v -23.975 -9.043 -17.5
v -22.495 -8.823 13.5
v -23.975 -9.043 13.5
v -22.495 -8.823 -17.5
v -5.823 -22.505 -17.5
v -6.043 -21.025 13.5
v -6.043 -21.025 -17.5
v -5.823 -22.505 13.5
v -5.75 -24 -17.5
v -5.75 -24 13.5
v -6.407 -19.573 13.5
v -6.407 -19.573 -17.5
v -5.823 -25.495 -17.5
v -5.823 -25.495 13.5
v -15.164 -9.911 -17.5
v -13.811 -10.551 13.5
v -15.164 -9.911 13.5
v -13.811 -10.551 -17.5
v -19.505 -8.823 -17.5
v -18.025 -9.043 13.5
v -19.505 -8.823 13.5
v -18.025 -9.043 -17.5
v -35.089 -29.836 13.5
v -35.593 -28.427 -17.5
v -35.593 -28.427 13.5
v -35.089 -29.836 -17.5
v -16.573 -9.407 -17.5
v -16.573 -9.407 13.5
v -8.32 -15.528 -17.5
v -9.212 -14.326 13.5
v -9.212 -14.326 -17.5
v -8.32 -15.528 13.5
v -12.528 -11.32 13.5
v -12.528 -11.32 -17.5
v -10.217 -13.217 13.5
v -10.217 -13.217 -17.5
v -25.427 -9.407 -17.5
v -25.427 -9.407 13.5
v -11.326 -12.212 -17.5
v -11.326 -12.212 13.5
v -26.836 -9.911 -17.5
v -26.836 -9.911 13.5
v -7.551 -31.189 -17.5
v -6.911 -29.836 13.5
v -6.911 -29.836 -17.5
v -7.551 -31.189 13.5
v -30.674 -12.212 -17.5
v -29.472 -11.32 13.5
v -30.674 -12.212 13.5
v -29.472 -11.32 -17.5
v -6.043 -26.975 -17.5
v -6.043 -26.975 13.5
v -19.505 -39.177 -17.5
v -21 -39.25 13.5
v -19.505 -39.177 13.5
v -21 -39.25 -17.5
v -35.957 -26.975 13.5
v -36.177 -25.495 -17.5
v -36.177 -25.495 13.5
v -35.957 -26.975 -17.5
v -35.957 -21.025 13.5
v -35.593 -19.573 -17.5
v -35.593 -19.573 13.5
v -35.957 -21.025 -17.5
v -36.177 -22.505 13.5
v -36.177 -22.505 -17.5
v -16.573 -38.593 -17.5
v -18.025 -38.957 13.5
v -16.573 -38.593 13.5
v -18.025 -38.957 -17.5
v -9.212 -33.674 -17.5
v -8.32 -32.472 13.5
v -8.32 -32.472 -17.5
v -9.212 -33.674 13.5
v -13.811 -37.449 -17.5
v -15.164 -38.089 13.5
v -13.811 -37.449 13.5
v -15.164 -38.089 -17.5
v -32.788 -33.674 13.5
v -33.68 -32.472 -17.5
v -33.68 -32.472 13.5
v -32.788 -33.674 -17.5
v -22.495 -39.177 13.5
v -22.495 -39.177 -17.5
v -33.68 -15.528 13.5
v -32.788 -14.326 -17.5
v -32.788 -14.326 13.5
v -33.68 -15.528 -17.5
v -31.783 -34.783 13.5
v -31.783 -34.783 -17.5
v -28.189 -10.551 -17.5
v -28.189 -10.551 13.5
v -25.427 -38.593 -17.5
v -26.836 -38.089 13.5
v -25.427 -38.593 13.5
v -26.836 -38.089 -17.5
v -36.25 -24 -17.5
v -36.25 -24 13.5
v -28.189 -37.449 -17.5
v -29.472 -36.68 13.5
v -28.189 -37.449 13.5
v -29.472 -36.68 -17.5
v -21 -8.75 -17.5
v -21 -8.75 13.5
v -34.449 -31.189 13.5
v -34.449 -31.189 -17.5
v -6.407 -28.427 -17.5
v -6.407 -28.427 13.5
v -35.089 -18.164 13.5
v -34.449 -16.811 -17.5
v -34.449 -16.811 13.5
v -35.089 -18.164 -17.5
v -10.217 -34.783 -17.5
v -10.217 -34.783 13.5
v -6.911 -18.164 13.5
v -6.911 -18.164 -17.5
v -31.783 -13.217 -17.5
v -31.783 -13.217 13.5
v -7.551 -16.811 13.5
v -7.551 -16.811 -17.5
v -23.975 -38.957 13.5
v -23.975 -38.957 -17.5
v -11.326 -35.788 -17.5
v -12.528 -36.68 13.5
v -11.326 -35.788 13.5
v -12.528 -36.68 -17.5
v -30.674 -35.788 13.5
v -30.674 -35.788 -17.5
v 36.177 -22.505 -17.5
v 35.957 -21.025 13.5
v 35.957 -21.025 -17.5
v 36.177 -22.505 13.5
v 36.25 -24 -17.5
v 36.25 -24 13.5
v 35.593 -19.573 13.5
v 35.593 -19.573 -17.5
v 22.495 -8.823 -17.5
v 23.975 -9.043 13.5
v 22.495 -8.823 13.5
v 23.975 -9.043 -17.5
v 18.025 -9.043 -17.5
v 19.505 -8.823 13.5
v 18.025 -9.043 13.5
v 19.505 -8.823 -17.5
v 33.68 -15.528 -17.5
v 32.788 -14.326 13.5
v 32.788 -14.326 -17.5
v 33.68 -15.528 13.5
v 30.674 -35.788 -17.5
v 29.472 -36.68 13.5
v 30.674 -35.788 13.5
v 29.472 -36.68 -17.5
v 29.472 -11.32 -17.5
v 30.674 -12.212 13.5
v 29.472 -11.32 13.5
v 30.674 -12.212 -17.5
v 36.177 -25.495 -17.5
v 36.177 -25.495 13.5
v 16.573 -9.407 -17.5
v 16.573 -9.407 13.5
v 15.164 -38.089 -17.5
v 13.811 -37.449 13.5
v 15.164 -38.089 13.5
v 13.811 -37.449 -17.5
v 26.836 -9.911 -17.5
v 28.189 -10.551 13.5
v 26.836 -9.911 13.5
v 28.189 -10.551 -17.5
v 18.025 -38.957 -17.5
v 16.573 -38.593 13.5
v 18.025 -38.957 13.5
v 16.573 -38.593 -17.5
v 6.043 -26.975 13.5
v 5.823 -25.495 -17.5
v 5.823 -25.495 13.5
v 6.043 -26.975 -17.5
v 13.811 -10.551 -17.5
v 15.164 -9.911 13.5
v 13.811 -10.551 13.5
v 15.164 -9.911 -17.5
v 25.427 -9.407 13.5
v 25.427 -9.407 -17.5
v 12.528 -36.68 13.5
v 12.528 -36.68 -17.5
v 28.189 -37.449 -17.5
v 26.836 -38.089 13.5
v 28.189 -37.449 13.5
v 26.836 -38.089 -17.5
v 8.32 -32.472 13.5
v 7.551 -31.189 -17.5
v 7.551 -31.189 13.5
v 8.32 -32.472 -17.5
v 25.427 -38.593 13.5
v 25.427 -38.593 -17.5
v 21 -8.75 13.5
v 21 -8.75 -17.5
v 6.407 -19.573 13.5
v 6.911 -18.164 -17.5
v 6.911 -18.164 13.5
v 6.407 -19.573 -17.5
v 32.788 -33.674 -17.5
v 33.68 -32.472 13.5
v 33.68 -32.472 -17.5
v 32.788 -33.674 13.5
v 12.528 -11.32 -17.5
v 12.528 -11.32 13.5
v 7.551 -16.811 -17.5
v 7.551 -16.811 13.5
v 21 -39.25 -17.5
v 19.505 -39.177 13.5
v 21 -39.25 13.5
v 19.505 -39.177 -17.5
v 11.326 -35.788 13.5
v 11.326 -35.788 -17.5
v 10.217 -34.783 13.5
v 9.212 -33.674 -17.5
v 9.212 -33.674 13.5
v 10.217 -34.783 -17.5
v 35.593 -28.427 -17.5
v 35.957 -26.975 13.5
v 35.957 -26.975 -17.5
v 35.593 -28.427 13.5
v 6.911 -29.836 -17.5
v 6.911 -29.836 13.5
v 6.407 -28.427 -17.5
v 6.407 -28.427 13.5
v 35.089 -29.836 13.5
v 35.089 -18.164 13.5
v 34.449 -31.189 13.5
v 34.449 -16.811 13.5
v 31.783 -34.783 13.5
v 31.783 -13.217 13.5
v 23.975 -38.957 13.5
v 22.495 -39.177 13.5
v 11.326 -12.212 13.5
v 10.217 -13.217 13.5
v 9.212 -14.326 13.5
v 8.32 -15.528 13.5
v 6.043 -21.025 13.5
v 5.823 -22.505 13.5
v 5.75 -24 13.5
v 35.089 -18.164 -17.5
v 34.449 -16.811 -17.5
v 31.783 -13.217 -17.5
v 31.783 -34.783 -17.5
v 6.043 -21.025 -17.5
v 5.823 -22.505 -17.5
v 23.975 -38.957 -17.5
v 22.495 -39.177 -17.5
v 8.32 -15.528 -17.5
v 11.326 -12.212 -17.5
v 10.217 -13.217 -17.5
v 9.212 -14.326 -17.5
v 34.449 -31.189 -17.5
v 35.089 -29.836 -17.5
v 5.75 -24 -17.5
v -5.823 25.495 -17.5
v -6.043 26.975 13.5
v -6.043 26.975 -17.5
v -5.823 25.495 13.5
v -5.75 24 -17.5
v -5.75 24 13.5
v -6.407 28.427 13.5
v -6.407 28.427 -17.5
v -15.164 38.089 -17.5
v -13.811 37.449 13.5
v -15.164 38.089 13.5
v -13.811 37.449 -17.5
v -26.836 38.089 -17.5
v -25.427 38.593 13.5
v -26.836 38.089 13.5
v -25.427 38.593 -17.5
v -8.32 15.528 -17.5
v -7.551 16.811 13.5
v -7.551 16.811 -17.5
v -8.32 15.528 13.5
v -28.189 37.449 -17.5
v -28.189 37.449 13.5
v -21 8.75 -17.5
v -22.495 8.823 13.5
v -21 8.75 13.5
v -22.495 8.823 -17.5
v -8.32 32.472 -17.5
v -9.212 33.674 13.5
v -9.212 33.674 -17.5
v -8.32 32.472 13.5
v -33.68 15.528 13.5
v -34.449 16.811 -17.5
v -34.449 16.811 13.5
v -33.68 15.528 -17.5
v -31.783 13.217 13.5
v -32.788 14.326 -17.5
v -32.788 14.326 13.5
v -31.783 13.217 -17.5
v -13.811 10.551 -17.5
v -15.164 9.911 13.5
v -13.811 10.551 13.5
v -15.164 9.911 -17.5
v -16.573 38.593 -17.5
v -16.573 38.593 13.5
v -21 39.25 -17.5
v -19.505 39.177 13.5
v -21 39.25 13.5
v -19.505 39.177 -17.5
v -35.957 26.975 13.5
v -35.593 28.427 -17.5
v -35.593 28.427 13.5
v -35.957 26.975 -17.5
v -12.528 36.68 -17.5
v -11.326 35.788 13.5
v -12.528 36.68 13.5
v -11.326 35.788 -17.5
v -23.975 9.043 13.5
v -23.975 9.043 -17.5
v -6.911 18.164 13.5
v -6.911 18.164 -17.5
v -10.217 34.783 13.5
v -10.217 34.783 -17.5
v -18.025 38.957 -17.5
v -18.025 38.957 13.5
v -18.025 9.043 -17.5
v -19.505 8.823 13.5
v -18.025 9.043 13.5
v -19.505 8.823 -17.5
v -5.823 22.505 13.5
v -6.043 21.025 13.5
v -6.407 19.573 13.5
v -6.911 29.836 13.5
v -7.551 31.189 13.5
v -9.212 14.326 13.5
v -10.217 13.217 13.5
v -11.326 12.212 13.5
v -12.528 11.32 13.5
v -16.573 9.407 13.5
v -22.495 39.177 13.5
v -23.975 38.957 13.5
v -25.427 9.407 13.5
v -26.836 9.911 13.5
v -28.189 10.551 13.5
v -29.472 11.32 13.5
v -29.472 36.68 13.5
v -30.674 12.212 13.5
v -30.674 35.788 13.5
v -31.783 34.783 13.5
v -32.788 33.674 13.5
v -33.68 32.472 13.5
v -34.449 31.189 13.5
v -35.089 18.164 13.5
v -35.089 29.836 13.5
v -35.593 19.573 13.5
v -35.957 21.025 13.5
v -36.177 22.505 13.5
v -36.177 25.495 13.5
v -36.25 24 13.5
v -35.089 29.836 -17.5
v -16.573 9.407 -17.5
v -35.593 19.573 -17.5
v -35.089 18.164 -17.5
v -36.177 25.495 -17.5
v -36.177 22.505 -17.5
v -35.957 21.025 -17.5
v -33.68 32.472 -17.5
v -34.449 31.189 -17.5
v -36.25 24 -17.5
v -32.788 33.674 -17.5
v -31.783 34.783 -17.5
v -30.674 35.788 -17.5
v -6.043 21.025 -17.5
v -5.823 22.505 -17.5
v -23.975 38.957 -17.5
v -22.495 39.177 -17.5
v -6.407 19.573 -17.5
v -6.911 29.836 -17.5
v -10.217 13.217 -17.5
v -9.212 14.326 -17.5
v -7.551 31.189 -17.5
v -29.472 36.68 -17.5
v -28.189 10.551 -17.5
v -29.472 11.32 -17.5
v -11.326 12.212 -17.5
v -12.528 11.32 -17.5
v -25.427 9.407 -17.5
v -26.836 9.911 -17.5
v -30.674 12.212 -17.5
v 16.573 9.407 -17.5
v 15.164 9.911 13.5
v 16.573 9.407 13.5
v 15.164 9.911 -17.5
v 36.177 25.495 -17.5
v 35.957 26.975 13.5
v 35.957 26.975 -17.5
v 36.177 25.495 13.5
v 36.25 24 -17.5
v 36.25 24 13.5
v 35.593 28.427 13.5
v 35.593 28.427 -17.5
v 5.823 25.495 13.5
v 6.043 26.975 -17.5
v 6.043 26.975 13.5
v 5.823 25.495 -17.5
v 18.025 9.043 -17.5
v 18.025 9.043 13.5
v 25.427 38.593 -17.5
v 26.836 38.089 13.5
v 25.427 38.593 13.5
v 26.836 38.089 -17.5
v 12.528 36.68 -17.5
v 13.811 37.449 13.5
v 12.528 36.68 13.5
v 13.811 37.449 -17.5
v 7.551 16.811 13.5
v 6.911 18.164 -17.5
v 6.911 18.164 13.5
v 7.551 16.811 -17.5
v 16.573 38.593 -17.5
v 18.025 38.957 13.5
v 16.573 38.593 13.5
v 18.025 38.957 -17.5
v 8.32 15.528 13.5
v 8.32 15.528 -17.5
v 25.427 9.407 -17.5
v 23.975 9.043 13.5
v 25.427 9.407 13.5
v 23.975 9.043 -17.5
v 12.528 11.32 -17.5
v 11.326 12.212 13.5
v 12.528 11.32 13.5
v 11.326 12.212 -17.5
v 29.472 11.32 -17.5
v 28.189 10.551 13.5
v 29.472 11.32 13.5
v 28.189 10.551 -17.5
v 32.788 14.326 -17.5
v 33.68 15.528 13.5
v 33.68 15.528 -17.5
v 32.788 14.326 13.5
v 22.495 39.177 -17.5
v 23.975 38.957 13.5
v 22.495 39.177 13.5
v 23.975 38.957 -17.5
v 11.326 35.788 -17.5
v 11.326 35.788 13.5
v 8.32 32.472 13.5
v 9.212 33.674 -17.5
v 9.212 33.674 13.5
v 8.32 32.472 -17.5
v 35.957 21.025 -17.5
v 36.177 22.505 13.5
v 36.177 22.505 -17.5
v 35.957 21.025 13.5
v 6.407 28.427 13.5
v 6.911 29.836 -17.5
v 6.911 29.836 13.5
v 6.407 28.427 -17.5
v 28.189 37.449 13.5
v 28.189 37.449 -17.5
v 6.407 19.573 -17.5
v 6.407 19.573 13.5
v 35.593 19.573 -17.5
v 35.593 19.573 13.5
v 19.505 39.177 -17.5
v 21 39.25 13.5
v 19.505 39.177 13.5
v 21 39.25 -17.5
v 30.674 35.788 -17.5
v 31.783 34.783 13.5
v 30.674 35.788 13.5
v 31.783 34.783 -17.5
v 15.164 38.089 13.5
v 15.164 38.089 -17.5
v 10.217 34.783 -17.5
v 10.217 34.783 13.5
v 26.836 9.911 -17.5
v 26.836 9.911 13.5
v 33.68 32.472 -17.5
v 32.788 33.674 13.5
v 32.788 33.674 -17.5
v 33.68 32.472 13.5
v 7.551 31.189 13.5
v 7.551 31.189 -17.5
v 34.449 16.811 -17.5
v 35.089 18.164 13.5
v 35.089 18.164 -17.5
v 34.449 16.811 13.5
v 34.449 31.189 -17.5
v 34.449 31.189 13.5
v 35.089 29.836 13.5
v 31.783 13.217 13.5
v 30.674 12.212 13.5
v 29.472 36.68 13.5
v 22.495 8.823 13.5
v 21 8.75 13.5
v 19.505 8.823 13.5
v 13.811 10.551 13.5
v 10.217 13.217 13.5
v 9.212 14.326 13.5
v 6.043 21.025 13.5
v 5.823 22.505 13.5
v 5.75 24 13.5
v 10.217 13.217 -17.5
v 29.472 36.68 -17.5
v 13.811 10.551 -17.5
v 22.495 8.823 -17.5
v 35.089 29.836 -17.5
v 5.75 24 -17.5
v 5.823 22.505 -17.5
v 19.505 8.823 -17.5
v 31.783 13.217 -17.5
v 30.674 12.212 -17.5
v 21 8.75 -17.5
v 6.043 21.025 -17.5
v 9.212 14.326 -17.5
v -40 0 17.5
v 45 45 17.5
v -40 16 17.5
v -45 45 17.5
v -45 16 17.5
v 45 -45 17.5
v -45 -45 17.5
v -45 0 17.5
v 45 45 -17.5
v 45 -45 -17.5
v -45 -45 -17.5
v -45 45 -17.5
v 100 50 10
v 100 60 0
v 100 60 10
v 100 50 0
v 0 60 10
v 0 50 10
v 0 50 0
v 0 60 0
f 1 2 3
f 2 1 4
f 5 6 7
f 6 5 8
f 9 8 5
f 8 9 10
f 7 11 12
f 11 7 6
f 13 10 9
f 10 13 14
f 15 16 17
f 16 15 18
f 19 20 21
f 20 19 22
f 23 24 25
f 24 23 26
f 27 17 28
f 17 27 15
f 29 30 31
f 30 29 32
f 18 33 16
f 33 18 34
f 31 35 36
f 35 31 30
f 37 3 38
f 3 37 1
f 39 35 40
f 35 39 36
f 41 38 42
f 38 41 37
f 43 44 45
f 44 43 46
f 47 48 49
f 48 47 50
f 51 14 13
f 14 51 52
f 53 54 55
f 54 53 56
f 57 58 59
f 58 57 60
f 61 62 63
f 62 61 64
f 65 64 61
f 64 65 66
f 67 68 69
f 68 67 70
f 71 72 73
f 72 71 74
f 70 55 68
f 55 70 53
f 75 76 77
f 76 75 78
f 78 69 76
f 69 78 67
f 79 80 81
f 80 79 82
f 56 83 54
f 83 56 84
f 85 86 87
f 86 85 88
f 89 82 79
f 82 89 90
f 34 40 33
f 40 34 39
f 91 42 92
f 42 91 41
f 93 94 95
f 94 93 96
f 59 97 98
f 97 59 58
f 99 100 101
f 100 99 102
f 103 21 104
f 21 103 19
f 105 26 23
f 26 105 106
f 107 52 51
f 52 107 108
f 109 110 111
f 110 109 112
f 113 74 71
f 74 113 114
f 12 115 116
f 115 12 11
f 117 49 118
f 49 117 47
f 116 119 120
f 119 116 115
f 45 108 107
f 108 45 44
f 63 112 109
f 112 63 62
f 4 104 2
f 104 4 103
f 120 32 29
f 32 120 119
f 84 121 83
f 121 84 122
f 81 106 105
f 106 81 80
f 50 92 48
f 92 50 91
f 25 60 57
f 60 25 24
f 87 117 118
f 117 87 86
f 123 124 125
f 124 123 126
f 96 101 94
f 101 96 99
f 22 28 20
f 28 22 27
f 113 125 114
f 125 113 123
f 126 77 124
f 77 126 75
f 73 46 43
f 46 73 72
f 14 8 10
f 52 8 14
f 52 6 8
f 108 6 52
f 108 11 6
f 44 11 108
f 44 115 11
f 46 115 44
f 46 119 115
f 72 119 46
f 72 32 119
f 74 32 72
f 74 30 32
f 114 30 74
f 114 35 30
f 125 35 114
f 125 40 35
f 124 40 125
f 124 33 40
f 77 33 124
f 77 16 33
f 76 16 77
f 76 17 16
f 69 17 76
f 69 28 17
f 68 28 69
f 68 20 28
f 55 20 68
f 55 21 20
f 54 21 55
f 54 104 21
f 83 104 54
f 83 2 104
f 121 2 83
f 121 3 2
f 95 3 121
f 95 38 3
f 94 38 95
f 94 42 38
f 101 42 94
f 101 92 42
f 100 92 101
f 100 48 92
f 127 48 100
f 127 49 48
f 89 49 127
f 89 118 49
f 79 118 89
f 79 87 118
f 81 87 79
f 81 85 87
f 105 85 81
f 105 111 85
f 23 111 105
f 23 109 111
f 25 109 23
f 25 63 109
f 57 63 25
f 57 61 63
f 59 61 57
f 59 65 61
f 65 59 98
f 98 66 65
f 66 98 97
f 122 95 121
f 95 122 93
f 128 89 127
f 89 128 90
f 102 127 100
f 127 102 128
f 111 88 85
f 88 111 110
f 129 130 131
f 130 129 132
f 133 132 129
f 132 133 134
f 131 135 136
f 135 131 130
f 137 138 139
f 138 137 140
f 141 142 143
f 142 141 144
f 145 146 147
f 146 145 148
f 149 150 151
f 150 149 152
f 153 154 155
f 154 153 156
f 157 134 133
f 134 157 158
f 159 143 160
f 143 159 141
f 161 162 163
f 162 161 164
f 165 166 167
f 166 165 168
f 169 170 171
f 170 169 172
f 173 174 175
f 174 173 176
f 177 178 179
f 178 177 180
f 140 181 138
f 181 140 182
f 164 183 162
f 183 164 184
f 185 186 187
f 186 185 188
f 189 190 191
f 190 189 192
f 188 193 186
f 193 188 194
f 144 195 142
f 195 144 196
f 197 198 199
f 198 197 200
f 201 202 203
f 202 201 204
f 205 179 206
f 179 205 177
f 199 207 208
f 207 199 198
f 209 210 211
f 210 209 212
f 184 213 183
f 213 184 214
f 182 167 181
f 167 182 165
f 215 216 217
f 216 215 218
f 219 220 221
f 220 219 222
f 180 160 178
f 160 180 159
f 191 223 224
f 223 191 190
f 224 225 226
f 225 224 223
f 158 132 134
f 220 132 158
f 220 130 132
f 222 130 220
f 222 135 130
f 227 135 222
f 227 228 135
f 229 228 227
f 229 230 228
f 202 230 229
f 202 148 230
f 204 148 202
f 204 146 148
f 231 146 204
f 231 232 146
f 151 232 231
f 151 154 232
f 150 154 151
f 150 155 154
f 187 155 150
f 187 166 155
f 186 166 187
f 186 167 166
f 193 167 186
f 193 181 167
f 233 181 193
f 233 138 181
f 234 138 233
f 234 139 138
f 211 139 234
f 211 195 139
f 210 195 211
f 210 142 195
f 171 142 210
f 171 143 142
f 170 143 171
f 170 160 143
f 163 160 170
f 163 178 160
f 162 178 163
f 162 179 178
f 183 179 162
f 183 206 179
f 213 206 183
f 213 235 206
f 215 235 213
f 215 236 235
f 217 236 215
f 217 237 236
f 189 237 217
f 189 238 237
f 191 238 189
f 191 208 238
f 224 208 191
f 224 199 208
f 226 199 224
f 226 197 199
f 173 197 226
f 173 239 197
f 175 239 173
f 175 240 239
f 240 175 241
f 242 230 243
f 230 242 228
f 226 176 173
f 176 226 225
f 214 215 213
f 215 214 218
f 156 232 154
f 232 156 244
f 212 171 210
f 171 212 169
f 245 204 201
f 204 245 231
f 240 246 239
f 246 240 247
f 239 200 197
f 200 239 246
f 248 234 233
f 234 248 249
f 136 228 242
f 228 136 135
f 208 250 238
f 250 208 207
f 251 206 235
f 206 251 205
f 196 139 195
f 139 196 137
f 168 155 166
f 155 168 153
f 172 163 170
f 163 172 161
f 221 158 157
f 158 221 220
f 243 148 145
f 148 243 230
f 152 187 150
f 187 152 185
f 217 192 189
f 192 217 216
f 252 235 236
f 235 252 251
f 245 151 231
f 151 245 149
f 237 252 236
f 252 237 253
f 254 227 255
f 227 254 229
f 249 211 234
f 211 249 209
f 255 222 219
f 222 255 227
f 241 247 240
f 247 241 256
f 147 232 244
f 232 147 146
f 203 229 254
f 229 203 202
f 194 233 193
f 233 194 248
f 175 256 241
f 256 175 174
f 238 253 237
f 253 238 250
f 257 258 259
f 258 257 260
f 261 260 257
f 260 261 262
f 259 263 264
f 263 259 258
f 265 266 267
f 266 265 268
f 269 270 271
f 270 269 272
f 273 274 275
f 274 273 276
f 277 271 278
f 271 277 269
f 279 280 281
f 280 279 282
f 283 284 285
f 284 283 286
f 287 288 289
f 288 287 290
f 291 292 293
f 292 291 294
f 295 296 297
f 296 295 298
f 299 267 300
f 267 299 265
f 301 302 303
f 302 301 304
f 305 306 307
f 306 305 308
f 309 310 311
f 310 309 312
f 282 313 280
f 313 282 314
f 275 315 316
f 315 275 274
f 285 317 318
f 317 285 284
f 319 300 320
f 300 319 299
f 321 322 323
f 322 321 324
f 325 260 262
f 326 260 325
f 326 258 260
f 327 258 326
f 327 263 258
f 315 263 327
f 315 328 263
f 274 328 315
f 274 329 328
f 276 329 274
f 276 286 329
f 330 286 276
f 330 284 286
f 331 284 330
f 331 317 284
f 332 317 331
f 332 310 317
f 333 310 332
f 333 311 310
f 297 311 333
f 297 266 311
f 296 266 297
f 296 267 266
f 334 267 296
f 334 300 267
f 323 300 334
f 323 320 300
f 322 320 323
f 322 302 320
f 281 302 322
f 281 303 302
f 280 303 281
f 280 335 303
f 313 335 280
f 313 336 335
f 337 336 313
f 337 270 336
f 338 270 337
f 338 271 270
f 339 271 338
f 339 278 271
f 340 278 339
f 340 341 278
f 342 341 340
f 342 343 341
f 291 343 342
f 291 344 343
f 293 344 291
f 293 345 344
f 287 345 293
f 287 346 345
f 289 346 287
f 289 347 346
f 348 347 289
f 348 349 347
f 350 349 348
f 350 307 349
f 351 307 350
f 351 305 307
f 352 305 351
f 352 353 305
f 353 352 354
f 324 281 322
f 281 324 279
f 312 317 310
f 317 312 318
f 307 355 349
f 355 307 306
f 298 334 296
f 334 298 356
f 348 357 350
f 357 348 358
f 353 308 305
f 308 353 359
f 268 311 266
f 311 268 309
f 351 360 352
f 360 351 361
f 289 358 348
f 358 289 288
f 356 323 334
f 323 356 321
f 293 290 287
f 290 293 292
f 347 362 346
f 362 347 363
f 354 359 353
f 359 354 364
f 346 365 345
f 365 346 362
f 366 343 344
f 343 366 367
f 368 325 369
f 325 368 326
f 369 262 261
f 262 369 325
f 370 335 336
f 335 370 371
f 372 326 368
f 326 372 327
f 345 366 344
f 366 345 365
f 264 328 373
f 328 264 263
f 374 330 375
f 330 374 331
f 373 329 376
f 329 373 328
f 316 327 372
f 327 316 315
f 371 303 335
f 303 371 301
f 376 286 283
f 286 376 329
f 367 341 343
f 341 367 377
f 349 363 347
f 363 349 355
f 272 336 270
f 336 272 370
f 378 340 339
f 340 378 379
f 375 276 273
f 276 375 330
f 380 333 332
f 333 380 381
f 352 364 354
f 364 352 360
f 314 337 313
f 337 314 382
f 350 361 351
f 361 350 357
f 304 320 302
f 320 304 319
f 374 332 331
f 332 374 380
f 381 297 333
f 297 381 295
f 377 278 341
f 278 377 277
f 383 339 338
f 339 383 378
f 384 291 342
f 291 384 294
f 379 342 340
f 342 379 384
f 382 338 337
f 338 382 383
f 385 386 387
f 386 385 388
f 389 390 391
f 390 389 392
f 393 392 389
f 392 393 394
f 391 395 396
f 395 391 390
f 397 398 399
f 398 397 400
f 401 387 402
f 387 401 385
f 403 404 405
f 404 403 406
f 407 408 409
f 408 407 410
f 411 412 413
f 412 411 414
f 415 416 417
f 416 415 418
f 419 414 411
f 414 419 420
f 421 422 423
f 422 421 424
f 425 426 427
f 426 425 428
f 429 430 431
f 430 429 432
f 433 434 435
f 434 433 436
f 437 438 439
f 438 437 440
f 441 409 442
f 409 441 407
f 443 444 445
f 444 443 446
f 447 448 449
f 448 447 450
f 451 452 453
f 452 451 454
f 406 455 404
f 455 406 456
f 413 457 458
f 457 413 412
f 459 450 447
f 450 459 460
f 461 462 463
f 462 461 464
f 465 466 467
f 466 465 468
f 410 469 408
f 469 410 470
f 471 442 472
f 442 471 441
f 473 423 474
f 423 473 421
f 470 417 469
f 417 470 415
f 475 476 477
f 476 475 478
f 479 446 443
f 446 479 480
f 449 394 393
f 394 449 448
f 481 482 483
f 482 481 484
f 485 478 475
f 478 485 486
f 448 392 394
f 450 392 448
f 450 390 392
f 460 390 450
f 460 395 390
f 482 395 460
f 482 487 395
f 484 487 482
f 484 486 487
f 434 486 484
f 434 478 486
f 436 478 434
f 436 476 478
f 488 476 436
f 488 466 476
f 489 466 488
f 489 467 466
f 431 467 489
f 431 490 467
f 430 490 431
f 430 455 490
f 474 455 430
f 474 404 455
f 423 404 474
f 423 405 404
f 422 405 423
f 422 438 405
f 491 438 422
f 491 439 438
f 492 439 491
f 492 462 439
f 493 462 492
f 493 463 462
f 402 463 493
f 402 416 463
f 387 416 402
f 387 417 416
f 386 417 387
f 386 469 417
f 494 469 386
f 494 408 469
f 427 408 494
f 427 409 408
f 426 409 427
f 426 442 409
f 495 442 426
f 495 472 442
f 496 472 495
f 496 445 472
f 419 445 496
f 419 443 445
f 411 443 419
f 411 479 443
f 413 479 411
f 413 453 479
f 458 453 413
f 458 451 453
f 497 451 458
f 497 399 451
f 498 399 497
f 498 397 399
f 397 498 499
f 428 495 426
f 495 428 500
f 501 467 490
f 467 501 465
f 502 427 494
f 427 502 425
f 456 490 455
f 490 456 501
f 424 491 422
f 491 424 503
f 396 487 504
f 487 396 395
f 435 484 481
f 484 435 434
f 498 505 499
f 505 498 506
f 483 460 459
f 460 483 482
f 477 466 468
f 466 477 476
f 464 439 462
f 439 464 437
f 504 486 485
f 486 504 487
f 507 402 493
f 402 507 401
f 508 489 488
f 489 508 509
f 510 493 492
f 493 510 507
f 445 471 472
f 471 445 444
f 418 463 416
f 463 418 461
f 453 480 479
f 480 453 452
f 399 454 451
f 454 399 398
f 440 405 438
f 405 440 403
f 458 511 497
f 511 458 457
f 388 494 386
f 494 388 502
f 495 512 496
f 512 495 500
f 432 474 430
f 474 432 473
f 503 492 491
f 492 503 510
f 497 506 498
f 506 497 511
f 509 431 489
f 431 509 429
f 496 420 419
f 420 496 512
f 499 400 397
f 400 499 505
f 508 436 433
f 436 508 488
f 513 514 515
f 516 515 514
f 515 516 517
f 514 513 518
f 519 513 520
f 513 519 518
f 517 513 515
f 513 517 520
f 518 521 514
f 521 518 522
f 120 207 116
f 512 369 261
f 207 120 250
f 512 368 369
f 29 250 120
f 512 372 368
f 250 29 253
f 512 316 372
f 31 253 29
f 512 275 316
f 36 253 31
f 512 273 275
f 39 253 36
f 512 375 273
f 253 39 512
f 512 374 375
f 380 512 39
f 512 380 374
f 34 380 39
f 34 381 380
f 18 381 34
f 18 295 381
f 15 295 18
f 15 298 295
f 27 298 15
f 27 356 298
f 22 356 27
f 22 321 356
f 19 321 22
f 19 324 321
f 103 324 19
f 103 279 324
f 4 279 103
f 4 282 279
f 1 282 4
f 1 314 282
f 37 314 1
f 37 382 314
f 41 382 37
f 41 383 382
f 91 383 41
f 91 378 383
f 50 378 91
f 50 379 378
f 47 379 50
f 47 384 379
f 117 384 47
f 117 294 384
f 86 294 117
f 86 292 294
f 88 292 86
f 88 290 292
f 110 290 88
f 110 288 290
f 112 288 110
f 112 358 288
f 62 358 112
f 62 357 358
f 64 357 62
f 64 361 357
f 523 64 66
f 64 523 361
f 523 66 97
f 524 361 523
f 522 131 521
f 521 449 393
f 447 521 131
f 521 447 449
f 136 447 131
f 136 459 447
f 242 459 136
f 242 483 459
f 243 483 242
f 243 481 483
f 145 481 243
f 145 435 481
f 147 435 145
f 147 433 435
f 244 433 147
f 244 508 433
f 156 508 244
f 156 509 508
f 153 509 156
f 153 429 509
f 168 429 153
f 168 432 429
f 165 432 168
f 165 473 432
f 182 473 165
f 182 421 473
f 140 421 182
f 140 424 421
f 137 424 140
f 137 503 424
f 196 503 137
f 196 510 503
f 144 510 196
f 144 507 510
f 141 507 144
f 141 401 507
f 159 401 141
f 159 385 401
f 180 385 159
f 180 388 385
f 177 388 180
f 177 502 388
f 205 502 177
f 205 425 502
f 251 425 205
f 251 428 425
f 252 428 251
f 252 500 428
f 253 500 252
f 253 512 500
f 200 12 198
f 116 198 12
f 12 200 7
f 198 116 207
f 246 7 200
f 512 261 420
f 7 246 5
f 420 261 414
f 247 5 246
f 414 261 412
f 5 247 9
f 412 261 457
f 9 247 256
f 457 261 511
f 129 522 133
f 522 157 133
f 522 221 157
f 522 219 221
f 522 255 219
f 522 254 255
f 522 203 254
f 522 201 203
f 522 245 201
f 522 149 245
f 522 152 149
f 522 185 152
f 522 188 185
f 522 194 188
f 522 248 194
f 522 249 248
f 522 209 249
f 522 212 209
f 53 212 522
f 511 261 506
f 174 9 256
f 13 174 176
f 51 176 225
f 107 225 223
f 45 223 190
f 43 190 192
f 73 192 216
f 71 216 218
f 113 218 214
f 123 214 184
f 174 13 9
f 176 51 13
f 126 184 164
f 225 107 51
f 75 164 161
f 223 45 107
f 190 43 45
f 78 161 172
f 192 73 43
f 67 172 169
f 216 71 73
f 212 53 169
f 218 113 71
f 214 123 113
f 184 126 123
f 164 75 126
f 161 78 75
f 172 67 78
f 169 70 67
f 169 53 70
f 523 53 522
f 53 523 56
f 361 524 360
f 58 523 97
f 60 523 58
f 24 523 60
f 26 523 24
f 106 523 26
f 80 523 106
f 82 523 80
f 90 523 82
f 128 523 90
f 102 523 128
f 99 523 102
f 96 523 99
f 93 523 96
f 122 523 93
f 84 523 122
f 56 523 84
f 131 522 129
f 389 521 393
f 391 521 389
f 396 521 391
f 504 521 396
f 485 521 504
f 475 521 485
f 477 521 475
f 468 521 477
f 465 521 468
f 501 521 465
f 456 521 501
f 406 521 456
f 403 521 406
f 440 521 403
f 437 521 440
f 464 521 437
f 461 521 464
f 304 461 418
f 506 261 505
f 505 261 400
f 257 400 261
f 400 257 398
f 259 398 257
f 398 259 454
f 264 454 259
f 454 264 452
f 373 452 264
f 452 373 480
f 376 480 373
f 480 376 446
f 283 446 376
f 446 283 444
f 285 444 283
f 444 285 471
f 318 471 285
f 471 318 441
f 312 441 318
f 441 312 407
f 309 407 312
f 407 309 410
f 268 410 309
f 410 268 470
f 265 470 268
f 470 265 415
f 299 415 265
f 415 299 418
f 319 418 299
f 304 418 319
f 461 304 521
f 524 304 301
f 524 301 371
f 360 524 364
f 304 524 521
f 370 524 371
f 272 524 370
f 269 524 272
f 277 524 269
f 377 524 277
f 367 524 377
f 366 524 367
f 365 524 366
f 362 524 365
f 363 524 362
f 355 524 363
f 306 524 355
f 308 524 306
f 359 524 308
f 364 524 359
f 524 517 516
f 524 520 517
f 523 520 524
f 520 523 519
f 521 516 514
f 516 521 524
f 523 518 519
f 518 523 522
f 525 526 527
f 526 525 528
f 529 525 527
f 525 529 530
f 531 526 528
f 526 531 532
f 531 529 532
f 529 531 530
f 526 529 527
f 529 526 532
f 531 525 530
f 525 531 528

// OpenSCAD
// --- Dimensions for Part 1: Base Block and Posts ---

// Base block dimensions
base_size_x = 90; // mm
base_size_y = 90; // mm
base_height = 35; // mm

// Tube seat dimensions
tube_diameter = 30.5; // mm
tube_depth = 30; // mm
floor_thickness = 5; // mm

// Tube seat positions (relative to center)
seat_x1 = -21; // mm
seat_x2 = 21;  // mm
seat_y1 = -24; // mm
seat_y2 = 24;  // mm

// Post dimensions
post_thickness_x = 10; // mm (X dimension)
post_width_y = 16;    // mm (Y dimension)
post_height = 160;    // mm
hole_size = 10.4;     // mm
hole_diameter = 10.4; // mm

// Post hole position (centered along X, at Z=150)
hole_z_center = 150; // mm

// --- Dimensions for Part 2: Handle ---

handle_width = 10;  // mm
handle_height = 10; // mm
handle_length = 100; // mm

// Handle placement relative to base (+Y face)
// Base max Y is 90/2 = 45. Gap of 10mm means handle starts at Y=55.
handle_gap_y = 10; // mm (Gap from +Y face of base, which is at Y=45)
handle_center_x = 0; // mm

// --- Global Settings ---
$fn = 64;

// ======================================================================
// PART 1: BASE BLOCK AND POSTS
// ======================================================================

module part1() {
    difference() {
        // 1. Base Block (Solid) - Centered on origin, Z=-17.5 to Z=17.5
        cube([base_size_x, base_size_y, base_height], center = true);

        // 2. Tube Seat Cutouts (4 holes)
        // The floor is at Z = -floor_thickness/2 = -2.5 if centered on Z=0.
        // We cut through the entire block depth to ensure clearance for the tube base.
        translate([0, 0, -base_height/2 - 1]) { // Start cutting below the lowest point of the block (-17.5)
            for (i = [1:4]) {
                if (i == 1) { // Seat 1: (-X, -Y)
                    translate([seat_x1, seat_y1, 0])
                        cylinder(h = tube_depth + 2, r = tube_diameter / 2);
                } else if (i == 2) { // Seat 2: (+X, -Y)
                    translate([seat_x2, seat_y1, 0])
                        cylinder(h = tube_depth + 2, r = tube_diameter / 2);
                } else if (i == 3) { // Seat 3: (-X, +Y)
                    translate([seat_x1, seat_y2, 0])
                        cylinder(h = tube_depth + 2, r = tube_diameter / 2);
                } else { // Seat 4: (+X, +Y)
                    translate([seat_x2, seat_y2, 0])
                        cylinder(h = tube_depth + 2, r = tube_diameter / 2);
                }
            }
        }

        // 3. Posts (Two posts on X ends)
        // Base top is at Z = base_height/2 = 17.5. Posts rise from here.
        // Post height is 160mm. Total Z span: [17.5, 17.5 + 160] = [17.5, 177.5]
        
        // Post 1: Left side (-X end)
        translate([-base_size_x/2 - post_thickness_x/2, 0, base_height/2]) { // Start at Z = 17.5
            cube([post_thickness_x, post_width_y, post_height]);

            // Hole through Post 1 (along X axis)
            // Center of hole is at Z=150 relative to the base center (Z=0).
            // Since the post starts at Z=17.5, the center height in the post's local frame is 150 - 17.5 = 132.5 mm from its bottom face.
            translate([hole_diameter/2 + 0.01, 0, hole_z_center - base_height/2]) {
                cube([hole_size - 0.02, post_width_y + 0.02, post_height]);
            }
        }

        // Post 2: Right side (+X end)
        translate([base_size_x/2 + post_thickness_x/2, 0, base_height/2]) { // Start at Z = 17.5
            cube([post_thickness_x, post_width_y, post_height]);

            // Hole through Post 2 (along X axis)
            translate([-hole_diameter/2 - 0.01, 0, hole_z_center - base_height/2]) { // Adjust Z offset: 150 - 17.5 = 132.5 from post bottom
                cube([hole_size - 0.02, post_width_y + 0.02, post_height]);
            }
        }

    }
}


// ======================================================================
// PART 2: HANDLE
// ======================================================================

module part2() {
    // Base max Y is base_size_y / 2 = 45 mm.
    // Handle starts at Y = 45 + handle_gap_y = 55 mm.
    // The handle must be centered on X=0, and its length is 100mm (X direction).

    // To ensure the handle sits flush against the posts' side faces when inserted, 
    // we need to center it vertically around Z=0 for simplicity in this modeling context, 
    // as the insertion happens through the posts which are centered on Y=0.
    translate([handle_center_x, base_size_y/2 + handle_gap_y - handle_height/2, 0]) {
        cube([handle_length, handle_height, handle_width]);
    }
}


// ======================================================================
// FINAL ASSEMBLY (Rendered as two separate parts)
// ======================================================================

// Render Part 1: Base Block and Posts
color("gray") {
    part1();
}

// Render Part 2: Handle
color("blue") {
    part2();
}
